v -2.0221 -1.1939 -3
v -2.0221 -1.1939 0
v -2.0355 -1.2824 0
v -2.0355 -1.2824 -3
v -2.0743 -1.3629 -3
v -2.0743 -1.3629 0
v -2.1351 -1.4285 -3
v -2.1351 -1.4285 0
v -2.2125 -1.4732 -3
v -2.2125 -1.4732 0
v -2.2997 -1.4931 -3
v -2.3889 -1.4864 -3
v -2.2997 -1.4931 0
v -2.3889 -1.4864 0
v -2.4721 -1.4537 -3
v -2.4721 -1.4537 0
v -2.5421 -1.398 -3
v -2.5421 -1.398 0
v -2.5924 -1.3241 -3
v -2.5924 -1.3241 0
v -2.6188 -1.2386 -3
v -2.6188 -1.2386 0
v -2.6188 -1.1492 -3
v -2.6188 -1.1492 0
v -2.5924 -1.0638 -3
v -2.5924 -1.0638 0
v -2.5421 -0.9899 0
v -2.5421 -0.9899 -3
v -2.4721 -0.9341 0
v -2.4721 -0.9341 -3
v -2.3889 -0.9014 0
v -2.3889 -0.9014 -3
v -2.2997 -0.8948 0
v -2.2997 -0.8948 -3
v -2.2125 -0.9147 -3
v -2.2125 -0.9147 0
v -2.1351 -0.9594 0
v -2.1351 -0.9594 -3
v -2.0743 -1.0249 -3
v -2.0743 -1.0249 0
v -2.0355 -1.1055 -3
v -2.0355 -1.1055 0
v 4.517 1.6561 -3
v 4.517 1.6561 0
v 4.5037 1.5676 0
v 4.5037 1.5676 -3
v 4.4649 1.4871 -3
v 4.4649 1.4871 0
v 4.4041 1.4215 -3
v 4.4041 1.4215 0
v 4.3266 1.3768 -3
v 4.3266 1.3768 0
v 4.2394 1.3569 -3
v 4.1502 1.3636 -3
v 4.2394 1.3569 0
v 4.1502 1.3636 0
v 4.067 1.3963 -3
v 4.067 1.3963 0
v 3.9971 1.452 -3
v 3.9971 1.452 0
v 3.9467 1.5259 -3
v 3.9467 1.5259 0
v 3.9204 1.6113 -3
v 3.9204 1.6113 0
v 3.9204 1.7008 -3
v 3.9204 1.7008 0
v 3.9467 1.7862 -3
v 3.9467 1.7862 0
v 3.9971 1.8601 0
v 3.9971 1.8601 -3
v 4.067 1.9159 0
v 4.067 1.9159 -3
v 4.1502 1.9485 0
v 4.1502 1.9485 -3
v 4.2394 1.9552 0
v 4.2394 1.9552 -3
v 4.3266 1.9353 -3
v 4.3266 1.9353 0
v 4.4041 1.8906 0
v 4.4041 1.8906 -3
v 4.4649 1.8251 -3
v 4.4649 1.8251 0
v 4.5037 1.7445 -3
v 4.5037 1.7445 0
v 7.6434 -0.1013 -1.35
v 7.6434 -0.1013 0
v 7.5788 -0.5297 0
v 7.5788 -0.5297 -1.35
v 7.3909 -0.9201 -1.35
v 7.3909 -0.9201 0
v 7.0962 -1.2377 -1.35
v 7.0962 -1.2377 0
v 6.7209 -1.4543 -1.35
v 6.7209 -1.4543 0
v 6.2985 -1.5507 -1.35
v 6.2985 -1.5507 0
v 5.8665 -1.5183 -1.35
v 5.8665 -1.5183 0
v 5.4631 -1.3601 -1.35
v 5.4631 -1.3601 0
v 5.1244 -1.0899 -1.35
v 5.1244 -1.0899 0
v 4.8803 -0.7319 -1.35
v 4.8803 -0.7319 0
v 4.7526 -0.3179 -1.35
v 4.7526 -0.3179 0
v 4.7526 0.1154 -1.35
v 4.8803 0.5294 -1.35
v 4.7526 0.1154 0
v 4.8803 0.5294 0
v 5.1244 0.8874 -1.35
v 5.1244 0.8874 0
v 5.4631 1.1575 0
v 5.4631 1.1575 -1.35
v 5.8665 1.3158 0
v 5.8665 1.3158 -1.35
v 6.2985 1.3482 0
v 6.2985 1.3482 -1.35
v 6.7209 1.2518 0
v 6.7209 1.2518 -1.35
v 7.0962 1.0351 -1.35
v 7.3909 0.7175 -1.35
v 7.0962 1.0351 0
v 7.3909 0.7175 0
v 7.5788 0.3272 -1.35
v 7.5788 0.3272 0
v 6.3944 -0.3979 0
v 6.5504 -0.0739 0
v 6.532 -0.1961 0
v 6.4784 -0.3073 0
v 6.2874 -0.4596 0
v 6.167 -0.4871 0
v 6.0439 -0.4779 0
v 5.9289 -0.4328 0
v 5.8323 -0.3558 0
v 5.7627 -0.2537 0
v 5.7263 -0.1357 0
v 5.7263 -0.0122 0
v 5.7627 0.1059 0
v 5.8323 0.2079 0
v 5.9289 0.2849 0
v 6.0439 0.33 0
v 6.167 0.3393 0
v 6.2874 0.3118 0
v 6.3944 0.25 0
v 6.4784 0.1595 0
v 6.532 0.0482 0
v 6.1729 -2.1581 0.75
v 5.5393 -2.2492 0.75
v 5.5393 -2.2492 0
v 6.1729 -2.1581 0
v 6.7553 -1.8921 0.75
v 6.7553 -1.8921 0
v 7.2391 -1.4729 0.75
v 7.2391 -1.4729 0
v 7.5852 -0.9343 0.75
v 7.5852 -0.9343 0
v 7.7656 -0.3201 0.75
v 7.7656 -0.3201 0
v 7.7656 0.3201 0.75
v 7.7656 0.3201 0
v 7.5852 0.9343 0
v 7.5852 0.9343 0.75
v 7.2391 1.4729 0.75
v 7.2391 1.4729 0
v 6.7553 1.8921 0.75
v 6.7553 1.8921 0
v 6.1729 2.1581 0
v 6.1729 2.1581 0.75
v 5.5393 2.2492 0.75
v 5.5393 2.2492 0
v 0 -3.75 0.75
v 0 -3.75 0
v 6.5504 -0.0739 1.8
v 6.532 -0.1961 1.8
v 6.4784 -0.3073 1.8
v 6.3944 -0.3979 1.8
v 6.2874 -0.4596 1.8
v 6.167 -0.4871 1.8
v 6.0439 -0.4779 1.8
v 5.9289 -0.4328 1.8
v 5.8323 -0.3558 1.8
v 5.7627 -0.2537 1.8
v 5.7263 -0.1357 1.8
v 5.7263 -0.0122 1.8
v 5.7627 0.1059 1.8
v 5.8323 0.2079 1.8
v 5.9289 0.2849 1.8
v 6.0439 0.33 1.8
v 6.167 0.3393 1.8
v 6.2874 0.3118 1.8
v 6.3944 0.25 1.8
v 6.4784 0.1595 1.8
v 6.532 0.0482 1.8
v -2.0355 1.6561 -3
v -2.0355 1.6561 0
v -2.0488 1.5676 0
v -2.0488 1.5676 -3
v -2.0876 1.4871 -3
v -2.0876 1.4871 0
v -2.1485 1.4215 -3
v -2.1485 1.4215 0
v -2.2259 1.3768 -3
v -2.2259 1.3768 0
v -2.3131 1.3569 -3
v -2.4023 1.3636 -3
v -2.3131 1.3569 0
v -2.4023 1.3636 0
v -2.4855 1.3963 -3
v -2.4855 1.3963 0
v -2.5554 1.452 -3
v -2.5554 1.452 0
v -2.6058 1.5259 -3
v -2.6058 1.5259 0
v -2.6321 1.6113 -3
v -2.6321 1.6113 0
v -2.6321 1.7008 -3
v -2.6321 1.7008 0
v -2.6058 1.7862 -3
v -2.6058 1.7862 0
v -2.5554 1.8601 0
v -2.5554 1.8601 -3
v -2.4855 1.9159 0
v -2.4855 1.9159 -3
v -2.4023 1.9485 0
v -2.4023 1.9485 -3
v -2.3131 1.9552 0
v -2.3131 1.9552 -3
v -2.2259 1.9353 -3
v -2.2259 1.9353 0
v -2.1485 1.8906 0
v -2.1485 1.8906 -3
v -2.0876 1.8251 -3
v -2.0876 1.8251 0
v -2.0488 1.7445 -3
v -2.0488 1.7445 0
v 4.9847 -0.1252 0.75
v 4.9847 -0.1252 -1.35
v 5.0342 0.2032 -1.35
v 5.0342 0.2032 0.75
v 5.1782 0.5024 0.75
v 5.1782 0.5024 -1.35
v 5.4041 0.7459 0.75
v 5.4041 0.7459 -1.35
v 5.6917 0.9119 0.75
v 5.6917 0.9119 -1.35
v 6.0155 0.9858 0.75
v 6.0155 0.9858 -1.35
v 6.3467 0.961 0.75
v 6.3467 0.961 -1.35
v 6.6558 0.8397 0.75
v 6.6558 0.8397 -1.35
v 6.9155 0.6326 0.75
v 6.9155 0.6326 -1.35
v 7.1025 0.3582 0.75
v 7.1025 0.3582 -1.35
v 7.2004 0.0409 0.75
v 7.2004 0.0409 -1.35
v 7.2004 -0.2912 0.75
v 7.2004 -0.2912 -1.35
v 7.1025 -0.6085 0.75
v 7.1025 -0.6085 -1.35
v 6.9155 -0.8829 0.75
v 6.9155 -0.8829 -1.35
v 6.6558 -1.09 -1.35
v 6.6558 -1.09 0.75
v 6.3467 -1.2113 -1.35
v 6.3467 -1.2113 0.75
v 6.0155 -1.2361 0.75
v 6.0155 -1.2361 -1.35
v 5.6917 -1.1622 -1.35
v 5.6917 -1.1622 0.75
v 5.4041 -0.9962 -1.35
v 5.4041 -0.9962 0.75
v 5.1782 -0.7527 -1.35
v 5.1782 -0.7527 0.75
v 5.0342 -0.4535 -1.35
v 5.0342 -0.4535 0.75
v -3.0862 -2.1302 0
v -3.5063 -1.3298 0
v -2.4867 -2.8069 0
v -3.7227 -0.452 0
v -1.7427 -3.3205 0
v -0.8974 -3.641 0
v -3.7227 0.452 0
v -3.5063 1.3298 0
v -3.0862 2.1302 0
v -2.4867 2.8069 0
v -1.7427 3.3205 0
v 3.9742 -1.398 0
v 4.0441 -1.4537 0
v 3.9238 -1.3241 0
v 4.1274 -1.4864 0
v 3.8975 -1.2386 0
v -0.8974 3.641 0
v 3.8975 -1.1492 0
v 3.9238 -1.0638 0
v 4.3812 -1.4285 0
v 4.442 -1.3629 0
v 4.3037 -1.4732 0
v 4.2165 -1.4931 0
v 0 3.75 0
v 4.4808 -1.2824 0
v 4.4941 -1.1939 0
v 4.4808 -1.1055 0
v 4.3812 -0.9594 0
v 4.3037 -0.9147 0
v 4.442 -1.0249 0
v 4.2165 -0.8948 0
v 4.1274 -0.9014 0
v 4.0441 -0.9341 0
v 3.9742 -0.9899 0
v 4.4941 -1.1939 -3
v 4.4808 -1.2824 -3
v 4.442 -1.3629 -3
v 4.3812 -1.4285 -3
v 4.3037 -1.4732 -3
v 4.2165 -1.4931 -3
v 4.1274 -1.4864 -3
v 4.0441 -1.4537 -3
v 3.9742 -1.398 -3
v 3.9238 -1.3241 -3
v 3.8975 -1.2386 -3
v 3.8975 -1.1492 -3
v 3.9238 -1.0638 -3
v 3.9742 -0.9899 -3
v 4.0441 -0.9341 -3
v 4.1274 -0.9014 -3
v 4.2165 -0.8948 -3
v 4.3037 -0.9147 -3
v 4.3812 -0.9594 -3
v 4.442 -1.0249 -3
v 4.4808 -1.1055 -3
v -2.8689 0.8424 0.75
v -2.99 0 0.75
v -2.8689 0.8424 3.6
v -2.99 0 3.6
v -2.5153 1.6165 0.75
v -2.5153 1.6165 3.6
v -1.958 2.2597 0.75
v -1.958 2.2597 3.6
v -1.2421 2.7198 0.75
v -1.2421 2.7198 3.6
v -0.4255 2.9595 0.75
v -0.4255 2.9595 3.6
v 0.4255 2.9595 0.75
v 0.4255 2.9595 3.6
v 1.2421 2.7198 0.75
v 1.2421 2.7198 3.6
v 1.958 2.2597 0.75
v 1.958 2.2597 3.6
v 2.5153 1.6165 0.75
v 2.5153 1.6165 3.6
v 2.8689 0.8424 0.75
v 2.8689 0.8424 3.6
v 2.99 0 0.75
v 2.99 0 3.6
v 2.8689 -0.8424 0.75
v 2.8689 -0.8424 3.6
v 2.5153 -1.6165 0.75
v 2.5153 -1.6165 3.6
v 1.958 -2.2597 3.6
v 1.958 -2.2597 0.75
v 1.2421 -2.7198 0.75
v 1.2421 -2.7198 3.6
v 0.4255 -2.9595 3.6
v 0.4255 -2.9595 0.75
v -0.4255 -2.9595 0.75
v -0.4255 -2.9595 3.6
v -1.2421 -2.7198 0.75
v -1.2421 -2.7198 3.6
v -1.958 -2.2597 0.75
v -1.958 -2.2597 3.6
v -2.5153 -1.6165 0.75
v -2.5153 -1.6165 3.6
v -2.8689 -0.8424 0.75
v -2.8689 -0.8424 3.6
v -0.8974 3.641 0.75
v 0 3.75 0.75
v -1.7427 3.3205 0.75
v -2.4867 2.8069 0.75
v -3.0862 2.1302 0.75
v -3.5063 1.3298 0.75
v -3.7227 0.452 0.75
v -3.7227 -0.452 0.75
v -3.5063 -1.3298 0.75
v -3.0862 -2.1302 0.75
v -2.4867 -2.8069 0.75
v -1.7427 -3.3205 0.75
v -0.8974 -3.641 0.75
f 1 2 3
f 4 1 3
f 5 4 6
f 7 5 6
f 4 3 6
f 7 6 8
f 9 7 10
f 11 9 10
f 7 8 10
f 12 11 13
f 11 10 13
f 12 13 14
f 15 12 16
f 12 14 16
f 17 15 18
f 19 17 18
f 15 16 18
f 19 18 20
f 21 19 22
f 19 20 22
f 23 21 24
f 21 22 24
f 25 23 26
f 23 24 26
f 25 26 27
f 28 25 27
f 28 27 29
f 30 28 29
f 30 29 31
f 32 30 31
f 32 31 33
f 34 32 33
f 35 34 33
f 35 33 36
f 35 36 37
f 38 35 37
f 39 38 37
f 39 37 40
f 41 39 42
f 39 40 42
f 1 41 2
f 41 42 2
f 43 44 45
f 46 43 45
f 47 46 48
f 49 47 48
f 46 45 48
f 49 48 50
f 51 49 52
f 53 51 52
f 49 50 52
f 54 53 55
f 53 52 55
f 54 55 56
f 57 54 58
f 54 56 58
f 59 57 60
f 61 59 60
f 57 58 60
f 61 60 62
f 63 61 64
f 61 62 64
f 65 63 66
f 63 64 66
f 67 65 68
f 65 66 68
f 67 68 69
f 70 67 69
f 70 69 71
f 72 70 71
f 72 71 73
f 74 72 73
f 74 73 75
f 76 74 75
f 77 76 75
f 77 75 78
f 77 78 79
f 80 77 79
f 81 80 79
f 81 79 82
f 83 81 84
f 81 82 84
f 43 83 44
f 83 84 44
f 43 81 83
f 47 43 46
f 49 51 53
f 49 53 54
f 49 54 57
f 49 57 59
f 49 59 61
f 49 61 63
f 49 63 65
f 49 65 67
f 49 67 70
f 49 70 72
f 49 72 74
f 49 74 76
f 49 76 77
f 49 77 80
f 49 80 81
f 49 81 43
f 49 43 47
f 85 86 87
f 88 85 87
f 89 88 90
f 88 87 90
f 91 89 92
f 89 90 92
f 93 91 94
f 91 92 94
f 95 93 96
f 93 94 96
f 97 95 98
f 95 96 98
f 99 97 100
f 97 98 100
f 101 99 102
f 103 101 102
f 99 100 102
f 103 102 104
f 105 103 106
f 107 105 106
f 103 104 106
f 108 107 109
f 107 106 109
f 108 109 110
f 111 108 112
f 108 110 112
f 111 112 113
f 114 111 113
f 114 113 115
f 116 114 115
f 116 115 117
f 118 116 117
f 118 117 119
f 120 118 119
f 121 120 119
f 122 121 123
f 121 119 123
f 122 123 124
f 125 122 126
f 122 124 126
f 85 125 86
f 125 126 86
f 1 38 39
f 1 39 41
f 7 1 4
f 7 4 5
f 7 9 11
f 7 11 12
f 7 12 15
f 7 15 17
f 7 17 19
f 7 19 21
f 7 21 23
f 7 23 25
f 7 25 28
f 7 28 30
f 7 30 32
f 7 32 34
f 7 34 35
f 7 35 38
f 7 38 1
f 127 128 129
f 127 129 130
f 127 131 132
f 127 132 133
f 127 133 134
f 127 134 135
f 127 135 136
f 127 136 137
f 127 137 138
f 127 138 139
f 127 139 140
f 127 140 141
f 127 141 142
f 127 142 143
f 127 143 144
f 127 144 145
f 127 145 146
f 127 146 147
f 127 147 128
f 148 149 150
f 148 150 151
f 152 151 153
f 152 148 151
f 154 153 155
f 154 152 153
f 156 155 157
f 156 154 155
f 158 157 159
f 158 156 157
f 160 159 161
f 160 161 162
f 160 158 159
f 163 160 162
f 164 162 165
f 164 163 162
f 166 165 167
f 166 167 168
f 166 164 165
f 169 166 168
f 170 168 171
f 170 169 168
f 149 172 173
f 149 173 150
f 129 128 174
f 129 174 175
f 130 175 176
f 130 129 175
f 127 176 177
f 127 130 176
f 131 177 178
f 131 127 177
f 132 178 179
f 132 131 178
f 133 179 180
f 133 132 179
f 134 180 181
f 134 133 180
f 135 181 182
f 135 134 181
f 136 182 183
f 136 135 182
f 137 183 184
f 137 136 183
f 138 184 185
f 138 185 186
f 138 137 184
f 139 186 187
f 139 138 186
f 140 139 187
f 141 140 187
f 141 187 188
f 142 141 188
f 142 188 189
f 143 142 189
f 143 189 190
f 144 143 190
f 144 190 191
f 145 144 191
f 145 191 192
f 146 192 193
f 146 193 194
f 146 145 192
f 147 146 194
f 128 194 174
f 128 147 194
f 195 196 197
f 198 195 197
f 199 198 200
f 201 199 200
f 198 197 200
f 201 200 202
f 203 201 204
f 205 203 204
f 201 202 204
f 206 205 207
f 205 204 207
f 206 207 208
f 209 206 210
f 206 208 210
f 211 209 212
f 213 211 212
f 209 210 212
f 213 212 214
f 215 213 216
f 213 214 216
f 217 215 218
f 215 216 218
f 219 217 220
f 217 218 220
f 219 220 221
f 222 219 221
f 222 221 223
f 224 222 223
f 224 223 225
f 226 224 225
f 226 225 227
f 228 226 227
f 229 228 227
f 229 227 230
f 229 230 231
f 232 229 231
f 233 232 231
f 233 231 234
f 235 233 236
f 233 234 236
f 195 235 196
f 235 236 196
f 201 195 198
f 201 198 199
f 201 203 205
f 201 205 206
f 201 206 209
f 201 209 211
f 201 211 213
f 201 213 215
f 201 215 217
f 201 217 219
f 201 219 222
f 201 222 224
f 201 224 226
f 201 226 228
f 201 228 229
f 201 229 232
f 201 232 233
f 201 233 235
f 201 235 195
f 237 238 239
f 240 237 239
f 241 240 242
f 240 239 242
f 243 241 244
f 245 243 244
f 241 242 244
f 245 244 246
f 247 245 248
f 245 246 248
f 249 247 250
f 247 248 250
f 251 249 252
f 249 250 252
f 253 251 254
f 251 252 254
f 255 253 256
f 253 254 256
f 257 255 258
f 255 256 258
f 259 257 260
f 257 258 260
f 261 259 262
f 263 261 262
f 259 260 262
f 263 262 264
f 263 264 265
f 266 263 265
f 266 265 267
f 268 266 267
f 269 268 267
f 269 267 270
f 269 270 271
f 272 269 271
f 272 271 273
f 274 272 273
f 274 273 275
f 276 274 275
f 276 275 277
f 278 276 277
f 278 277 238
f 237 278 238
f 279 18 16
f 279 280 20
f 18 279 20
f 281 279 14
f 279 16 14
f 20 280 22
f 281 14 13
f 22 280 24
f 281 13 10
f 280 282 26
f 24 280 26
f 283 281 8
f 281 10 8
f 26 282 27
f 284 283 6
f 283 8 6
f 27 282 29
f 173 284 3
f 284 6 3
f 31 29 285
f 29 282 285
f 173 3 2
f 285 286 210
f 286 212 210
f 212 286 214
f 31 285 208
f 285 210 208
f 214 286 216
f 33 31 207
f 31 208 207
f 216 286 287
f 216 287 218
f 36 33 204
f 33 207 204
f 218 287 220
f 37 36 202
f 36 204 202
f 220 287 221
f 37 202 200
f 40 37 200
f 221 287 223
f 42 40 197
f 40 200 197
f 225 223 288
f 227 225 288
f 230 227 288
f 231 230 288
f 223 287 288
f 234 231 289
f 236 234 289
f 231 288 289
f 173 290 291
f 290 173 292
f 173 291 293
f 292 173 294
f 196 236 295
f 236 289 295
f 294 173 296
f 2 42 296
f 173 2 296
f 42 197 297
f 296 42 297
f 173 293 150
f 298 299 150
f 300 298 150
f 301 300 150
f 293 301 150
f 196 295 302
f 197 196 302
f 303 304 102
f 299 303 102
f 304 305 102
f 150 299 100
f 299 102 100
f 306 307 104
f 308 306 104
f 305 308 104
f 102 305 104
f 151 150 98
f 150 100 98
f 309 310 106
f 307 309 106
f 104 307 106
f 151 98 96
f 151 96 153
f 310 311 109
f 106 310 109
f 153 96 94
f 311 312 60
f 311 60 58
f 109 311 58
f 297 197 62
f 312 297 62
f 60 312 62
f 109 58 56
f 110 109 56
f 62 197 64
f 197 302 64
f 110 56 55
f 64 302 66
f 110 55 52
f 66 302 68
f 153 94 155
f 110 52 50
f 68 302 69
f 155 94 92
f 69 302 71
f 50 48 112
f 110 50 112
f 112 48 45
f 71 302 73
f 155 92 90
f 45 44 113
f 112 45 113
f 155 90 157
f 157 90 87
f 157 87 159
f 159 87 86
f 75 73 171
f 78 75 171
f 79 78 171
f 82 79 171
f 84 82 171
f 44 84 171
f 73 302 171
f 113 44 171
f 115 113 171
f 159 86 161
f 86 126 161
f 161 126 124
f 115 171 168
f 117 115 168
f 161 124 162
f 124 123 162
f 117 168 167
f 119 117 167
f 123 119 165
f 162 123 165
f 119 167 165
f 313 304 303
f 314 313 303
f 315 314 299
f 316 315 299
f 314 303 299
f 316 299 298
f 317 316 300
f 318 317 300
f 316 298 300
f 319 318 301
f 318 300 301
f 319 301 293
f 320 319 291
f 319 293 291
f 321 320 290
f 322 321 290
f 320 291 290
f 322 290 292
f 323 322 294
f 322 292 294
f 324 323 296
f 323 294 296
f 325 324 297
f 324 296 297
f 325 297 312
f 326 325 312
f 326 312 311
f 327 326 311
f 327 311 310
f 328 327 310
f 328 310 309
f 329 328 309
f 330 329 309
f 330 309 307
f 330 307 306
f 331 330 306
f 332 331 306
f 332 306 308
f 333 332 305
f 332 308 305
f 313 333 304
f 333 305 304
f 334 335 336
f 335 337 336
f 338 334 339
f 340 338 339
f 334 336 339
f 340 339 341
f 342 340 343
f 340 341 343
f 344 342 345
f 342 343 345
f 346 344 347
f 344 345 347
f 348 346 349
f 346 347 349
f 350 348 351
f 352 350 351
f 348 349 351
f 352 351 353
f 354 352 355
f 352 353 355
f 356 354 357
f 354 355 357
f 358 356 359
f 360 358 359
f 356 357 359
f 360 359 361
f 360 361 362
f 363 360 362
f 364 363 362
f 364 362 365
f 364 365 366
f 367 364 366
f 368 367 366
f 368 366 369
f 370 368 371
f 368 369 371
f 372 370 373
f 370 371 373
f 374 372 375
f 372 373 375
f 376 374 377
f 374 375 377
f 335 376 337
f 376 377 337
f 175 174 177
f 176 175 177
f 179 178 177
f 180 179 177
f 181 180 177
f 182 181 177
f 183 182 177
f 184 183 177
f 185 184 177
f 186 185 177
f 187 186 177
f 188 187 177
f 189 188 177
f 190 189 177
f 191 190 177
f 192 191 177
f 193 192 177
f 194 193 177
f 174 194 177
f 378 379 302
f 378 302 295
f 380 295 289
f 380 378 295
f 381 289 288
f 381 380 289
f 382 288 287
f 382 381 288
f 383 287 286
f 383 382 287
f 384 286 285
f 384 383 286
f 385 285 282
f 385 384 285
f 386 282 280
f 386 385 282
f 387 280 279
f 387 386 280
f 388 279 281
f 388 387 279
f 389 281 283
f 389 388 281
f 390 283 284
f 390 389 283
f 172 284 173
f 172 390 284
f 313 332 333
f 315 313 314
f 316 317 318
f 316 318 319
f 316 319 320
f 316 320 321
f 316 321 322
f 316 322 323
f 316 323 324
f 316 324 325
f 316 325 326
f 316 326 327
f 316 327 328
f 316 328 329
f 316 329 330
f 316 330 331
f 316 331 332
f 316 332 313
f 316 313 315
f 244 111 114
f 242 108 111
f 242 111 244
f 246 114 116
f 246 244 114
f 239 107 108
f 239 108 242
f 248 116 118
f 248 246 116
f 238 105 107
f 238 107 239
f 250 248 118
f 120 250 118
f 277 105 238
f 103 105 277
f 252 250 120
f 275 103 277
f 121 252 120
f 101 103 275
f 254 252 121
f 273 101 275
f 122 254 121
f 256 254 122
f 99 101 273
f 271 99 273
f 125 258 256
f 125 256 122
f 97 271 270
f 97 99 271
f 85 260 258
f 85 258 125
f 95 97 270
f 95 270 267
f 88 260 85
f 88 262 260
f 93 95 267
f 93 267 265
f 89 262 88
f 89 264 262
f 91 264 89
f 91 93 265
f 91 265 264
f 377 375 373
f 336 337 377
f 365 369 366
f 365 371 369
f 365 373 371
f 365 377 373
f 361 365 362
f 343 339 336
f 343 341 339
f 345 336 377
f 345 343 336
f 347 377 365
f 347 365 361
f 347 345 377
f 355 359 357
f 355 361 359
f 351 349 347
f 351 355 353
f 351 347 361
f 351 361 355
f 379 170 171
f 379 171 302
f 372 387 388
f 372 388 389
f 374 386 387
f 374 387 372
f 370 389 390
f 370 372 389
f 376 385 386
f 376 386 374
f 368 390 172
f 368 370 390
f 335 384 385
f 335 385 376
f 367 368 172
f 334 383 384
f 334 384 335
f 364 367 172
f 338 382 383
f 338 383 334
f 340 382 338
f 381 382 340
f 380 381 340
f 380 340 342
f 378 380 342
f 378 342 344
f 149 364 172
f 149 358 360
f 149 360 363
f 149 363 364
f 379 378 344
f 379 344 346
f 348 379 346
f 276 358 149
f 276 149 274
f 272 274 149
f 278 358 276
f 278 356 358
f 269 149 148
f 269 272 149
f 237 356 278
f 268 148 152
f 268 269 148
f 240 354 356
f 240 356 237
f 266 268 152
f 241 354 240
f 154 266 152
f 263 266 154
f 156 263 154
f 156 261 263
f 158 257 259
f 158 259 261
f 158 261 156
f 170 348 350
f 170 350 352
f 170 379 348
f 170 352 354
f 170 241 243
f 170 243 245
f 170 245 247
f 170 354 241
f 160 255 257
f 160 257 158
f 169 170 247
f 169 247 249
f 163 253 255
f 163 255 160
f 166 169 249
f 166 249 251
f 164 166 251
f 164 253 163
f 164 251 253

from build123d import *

# Parameters (mm, degrees)
BOSS_EXTRUDE1_DEPTH  = 0.75
SKETCH2_R            = 1.453519805
BOSS_EXTRUDE2_DEPTH  = 1.35
M2_CLEARANCE_HOLE1_D = 2.22821008
SKETCH5_R            = 0.414358547
BOSS_EXTRUDE3_DEPTH  = 1.8
SKETCH6_R            = 0.3
BOSS_EXTRUDE4_DEPTH  = 3
SKETCH7_R            = 0.3
BOSS_EXTRUDE5_DEPTH  = 3
SKETCH8_R            = 0.3
BOSS_EXTRUDE6_DEPTH  = 3
SKETCH9_R            = 0.3
BOSS_EXTRUDE7_DEPTH  = 3
SKETCH10_W           = 2.989968033
SKETCH10_H           = 2.85


with BuildPart() as part:
    # Sketch1 → Boss-Extrude1 (new body)
    with BuildSketch(Plane.XY.offset(0.75)):
        with BuildLine():
            Line((0, -3.75), (5.539283427, -2.24917213))
            ThreePointArc((5.539283427, -2.24917213), (7.788455557, 0), (5.539283427, 2.24917213))
            Line((5.539283427, 2.24917213), (0, 3.75))
            ThreePointArc((0, 3.75), (-3.75, 0), (0, -3.75))
        make_face()
    extrude(amount=-BOSS_EXTRUDE1_DEPTH)

    # Sketch2 → Boss-Extrude2 (add)
    with BuildSketch(Plane(origin=(0, 0, 0), x_dir=(-1, 0, 0), z_dir=(0, 0, -1))):
        with Locations(Location((-6.189903002, -0.101269822, 0), (0, 0, 180))):
            Circle(SKETCH2_R)
    extrude(amount=BOSS_EXTRUDE2_DEPTH)

    # M2 Clearance Hole1 (through all)
    with Locations(Plane.XY.offset(0.75)):
        with Locations((6.098758585, -0.125150984)):
            Hole(M2_CLEARANCE_HOLE1_D / 2)

    # Sketch6 → Boss-Extrude4 (add)
    with BuildSketch(Plane(origin=(0, 0, 0), x_dir=(-1, 0, 0), z_dir=(0, 0, -1))):
        with Locations(Location((-4.194127883, -1.193925315, 0), (0, 0, 180))):
            Circle(SKETCH6_R)
    extrude(amount=BOSS_EXTRUDE4_DEPTH)

    # Sketch7 → Boss-Extrude5 (add)
    with BuildSketch(Plane(origin=(0, 0, 0), x_dir=(-1, 0, 0), z_dir=(0, 0, -1))):
        with Locations(Location((2.322145059, -1.193925315, 0), (0, 0, 180))):
            Circle(SKETCH7_R)
    extrude(amount=BOSS_EXTRUDE5_DEPTH)

    # Sketch8 → Boss-Extrude6 (add)
    with BuildSketch(Plane(origin=(0, 0, 0), x_dir=(-1, 0, 0), z_dir=(0, 0, -1))):
        with Locations(Location((-4.217003228, 1.656061577, 0), (0, 0, 180))):
            Circle(SKETCH8_R)
    extrude(amount=BOSS_EXTRUDE6_DEPTH)

    # Sketch9 → Boss-Extrude7 (add)
    with BuildSketch(Plane(origin=(0, 0, 0), x_dir=(-1, 0, 0), z_dir=(0, 0, -1))):
        with Locations(Location((2.335500338, 1.656061577, 0), (0, 0, 180))):
            Circle(SKETCH9_R)
    extrude(amount=BOSS_EXTRUDE7_DEPTH)

    # Sketch10 → Revolve1 (revolve)
    with BuildSketch(Plane.XZ, mode=Mode.PRIVATE) as revolve1_sk:
        with Locations((1.494984017, 2.175)):
            Rectangle(SKETCH10_W, SKETCH10_H)
    revolve(revolve1_sk.sketch.rotate(Axis((0, 0, 3.6), (0, 0, -1)), 180), axis=Axis((0, 0, 3.6), (0, 0, -1)))


with BuildPart() as body_2:
    # Sketch5 → Boss-Extrude3 (new body)
    with BuildSketch(Plane(origin=(0, 0, 0), x_dir=(-1, 0, 0), z_dir=(0, 0, -1))):
        with Locations(Location((-6.136062205, -0.07392106, 0), (0, 0, 180))):
            Circle(SKETCH5_R)
    extrude(amount=-BOSS_EXTRUDE3_DEPTH)


solid = Compound([part.part, body_2.part])
